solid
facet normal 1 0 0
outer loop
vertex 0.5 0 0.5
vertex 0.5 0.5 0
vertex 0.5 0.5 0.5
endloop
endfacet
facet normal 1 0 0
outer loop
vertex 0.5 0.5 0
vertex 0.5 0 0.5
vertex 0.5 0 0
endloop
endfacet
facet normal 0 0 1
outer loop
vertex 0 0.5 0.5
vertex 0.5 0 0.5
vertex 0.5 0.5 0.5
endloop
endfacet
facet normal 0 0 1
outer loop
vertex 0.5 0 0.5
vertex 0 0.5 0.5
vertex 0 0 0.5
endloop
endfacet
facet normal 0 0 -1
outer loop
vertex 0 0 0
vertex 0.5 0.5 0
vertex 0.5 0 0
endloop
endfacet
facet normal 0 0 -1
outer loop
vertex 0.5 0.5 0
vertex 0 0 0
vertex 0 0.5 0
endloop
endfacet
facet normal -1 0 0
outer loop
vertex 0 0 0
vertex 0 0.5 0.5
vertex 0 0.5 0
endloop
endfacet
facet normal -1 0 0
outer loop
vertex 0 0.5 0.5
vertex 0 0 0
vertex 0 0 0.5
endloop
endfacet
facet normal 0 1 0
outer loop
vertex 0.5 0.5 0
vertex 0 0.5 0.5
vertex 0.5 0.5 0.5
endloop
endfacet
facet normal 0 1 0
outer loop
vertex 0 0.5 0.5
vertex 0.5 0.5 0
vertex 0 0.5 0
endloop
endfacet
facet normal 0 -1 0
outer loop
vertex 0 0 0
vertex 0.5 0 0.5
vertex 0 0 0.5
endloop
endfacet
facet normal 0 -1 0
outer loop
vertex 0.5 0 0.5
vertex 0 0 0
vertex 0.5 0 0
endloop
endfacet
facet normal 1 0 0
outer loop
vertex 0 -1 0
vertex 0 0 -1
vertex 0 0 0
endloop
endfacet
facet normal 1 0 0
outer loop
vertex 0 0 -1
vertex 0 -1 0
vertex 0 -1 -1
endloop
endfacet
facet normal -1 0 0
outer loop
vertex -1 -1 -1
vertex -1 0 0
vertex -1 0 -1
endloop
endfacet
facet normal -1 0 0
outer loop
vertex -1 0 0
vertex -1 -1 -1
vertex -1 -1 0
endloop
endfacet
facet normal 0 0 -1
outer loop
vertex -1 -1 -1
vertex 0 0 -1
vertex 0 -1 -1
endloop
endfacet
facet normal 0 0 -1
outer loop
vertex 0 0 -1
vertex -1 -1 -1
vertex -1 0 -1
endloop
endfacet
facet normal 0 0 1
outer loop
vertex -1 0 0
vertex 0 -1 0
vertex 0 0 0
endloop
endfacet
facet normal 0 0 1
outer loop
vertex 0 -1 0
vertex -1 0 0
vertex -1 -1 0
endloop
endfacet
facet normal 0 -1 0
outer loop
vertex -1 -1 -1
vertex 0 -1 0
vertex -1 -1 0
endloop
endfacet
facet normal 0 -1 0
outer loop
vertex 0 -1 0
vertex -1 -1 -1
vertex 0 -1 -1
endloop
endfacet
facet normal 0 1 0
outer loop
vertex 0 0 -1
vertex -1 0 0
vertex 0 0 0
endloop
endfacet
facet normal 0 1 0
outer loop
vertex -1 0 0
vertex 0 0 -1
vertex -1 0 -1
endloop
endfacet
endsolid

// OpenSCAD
multmatrix([[1,0,0,0],[0,1,0,0],[0,0,1,0],[0,0,0,2]]) cube();
multmatrix([[1,0,0,0],[0,1,0,0],[0,0,1,0],[0,0,0,-1]]) cube();
multmatrix([[1,0,0,0],[0,1,0,0],[0,0,1,0],[1,2,3,2]]) cube();
multmatrix([[1,0,0,0],[0,1,0,0],[0,0,1,0],[0,0,0,0]]) cube();
